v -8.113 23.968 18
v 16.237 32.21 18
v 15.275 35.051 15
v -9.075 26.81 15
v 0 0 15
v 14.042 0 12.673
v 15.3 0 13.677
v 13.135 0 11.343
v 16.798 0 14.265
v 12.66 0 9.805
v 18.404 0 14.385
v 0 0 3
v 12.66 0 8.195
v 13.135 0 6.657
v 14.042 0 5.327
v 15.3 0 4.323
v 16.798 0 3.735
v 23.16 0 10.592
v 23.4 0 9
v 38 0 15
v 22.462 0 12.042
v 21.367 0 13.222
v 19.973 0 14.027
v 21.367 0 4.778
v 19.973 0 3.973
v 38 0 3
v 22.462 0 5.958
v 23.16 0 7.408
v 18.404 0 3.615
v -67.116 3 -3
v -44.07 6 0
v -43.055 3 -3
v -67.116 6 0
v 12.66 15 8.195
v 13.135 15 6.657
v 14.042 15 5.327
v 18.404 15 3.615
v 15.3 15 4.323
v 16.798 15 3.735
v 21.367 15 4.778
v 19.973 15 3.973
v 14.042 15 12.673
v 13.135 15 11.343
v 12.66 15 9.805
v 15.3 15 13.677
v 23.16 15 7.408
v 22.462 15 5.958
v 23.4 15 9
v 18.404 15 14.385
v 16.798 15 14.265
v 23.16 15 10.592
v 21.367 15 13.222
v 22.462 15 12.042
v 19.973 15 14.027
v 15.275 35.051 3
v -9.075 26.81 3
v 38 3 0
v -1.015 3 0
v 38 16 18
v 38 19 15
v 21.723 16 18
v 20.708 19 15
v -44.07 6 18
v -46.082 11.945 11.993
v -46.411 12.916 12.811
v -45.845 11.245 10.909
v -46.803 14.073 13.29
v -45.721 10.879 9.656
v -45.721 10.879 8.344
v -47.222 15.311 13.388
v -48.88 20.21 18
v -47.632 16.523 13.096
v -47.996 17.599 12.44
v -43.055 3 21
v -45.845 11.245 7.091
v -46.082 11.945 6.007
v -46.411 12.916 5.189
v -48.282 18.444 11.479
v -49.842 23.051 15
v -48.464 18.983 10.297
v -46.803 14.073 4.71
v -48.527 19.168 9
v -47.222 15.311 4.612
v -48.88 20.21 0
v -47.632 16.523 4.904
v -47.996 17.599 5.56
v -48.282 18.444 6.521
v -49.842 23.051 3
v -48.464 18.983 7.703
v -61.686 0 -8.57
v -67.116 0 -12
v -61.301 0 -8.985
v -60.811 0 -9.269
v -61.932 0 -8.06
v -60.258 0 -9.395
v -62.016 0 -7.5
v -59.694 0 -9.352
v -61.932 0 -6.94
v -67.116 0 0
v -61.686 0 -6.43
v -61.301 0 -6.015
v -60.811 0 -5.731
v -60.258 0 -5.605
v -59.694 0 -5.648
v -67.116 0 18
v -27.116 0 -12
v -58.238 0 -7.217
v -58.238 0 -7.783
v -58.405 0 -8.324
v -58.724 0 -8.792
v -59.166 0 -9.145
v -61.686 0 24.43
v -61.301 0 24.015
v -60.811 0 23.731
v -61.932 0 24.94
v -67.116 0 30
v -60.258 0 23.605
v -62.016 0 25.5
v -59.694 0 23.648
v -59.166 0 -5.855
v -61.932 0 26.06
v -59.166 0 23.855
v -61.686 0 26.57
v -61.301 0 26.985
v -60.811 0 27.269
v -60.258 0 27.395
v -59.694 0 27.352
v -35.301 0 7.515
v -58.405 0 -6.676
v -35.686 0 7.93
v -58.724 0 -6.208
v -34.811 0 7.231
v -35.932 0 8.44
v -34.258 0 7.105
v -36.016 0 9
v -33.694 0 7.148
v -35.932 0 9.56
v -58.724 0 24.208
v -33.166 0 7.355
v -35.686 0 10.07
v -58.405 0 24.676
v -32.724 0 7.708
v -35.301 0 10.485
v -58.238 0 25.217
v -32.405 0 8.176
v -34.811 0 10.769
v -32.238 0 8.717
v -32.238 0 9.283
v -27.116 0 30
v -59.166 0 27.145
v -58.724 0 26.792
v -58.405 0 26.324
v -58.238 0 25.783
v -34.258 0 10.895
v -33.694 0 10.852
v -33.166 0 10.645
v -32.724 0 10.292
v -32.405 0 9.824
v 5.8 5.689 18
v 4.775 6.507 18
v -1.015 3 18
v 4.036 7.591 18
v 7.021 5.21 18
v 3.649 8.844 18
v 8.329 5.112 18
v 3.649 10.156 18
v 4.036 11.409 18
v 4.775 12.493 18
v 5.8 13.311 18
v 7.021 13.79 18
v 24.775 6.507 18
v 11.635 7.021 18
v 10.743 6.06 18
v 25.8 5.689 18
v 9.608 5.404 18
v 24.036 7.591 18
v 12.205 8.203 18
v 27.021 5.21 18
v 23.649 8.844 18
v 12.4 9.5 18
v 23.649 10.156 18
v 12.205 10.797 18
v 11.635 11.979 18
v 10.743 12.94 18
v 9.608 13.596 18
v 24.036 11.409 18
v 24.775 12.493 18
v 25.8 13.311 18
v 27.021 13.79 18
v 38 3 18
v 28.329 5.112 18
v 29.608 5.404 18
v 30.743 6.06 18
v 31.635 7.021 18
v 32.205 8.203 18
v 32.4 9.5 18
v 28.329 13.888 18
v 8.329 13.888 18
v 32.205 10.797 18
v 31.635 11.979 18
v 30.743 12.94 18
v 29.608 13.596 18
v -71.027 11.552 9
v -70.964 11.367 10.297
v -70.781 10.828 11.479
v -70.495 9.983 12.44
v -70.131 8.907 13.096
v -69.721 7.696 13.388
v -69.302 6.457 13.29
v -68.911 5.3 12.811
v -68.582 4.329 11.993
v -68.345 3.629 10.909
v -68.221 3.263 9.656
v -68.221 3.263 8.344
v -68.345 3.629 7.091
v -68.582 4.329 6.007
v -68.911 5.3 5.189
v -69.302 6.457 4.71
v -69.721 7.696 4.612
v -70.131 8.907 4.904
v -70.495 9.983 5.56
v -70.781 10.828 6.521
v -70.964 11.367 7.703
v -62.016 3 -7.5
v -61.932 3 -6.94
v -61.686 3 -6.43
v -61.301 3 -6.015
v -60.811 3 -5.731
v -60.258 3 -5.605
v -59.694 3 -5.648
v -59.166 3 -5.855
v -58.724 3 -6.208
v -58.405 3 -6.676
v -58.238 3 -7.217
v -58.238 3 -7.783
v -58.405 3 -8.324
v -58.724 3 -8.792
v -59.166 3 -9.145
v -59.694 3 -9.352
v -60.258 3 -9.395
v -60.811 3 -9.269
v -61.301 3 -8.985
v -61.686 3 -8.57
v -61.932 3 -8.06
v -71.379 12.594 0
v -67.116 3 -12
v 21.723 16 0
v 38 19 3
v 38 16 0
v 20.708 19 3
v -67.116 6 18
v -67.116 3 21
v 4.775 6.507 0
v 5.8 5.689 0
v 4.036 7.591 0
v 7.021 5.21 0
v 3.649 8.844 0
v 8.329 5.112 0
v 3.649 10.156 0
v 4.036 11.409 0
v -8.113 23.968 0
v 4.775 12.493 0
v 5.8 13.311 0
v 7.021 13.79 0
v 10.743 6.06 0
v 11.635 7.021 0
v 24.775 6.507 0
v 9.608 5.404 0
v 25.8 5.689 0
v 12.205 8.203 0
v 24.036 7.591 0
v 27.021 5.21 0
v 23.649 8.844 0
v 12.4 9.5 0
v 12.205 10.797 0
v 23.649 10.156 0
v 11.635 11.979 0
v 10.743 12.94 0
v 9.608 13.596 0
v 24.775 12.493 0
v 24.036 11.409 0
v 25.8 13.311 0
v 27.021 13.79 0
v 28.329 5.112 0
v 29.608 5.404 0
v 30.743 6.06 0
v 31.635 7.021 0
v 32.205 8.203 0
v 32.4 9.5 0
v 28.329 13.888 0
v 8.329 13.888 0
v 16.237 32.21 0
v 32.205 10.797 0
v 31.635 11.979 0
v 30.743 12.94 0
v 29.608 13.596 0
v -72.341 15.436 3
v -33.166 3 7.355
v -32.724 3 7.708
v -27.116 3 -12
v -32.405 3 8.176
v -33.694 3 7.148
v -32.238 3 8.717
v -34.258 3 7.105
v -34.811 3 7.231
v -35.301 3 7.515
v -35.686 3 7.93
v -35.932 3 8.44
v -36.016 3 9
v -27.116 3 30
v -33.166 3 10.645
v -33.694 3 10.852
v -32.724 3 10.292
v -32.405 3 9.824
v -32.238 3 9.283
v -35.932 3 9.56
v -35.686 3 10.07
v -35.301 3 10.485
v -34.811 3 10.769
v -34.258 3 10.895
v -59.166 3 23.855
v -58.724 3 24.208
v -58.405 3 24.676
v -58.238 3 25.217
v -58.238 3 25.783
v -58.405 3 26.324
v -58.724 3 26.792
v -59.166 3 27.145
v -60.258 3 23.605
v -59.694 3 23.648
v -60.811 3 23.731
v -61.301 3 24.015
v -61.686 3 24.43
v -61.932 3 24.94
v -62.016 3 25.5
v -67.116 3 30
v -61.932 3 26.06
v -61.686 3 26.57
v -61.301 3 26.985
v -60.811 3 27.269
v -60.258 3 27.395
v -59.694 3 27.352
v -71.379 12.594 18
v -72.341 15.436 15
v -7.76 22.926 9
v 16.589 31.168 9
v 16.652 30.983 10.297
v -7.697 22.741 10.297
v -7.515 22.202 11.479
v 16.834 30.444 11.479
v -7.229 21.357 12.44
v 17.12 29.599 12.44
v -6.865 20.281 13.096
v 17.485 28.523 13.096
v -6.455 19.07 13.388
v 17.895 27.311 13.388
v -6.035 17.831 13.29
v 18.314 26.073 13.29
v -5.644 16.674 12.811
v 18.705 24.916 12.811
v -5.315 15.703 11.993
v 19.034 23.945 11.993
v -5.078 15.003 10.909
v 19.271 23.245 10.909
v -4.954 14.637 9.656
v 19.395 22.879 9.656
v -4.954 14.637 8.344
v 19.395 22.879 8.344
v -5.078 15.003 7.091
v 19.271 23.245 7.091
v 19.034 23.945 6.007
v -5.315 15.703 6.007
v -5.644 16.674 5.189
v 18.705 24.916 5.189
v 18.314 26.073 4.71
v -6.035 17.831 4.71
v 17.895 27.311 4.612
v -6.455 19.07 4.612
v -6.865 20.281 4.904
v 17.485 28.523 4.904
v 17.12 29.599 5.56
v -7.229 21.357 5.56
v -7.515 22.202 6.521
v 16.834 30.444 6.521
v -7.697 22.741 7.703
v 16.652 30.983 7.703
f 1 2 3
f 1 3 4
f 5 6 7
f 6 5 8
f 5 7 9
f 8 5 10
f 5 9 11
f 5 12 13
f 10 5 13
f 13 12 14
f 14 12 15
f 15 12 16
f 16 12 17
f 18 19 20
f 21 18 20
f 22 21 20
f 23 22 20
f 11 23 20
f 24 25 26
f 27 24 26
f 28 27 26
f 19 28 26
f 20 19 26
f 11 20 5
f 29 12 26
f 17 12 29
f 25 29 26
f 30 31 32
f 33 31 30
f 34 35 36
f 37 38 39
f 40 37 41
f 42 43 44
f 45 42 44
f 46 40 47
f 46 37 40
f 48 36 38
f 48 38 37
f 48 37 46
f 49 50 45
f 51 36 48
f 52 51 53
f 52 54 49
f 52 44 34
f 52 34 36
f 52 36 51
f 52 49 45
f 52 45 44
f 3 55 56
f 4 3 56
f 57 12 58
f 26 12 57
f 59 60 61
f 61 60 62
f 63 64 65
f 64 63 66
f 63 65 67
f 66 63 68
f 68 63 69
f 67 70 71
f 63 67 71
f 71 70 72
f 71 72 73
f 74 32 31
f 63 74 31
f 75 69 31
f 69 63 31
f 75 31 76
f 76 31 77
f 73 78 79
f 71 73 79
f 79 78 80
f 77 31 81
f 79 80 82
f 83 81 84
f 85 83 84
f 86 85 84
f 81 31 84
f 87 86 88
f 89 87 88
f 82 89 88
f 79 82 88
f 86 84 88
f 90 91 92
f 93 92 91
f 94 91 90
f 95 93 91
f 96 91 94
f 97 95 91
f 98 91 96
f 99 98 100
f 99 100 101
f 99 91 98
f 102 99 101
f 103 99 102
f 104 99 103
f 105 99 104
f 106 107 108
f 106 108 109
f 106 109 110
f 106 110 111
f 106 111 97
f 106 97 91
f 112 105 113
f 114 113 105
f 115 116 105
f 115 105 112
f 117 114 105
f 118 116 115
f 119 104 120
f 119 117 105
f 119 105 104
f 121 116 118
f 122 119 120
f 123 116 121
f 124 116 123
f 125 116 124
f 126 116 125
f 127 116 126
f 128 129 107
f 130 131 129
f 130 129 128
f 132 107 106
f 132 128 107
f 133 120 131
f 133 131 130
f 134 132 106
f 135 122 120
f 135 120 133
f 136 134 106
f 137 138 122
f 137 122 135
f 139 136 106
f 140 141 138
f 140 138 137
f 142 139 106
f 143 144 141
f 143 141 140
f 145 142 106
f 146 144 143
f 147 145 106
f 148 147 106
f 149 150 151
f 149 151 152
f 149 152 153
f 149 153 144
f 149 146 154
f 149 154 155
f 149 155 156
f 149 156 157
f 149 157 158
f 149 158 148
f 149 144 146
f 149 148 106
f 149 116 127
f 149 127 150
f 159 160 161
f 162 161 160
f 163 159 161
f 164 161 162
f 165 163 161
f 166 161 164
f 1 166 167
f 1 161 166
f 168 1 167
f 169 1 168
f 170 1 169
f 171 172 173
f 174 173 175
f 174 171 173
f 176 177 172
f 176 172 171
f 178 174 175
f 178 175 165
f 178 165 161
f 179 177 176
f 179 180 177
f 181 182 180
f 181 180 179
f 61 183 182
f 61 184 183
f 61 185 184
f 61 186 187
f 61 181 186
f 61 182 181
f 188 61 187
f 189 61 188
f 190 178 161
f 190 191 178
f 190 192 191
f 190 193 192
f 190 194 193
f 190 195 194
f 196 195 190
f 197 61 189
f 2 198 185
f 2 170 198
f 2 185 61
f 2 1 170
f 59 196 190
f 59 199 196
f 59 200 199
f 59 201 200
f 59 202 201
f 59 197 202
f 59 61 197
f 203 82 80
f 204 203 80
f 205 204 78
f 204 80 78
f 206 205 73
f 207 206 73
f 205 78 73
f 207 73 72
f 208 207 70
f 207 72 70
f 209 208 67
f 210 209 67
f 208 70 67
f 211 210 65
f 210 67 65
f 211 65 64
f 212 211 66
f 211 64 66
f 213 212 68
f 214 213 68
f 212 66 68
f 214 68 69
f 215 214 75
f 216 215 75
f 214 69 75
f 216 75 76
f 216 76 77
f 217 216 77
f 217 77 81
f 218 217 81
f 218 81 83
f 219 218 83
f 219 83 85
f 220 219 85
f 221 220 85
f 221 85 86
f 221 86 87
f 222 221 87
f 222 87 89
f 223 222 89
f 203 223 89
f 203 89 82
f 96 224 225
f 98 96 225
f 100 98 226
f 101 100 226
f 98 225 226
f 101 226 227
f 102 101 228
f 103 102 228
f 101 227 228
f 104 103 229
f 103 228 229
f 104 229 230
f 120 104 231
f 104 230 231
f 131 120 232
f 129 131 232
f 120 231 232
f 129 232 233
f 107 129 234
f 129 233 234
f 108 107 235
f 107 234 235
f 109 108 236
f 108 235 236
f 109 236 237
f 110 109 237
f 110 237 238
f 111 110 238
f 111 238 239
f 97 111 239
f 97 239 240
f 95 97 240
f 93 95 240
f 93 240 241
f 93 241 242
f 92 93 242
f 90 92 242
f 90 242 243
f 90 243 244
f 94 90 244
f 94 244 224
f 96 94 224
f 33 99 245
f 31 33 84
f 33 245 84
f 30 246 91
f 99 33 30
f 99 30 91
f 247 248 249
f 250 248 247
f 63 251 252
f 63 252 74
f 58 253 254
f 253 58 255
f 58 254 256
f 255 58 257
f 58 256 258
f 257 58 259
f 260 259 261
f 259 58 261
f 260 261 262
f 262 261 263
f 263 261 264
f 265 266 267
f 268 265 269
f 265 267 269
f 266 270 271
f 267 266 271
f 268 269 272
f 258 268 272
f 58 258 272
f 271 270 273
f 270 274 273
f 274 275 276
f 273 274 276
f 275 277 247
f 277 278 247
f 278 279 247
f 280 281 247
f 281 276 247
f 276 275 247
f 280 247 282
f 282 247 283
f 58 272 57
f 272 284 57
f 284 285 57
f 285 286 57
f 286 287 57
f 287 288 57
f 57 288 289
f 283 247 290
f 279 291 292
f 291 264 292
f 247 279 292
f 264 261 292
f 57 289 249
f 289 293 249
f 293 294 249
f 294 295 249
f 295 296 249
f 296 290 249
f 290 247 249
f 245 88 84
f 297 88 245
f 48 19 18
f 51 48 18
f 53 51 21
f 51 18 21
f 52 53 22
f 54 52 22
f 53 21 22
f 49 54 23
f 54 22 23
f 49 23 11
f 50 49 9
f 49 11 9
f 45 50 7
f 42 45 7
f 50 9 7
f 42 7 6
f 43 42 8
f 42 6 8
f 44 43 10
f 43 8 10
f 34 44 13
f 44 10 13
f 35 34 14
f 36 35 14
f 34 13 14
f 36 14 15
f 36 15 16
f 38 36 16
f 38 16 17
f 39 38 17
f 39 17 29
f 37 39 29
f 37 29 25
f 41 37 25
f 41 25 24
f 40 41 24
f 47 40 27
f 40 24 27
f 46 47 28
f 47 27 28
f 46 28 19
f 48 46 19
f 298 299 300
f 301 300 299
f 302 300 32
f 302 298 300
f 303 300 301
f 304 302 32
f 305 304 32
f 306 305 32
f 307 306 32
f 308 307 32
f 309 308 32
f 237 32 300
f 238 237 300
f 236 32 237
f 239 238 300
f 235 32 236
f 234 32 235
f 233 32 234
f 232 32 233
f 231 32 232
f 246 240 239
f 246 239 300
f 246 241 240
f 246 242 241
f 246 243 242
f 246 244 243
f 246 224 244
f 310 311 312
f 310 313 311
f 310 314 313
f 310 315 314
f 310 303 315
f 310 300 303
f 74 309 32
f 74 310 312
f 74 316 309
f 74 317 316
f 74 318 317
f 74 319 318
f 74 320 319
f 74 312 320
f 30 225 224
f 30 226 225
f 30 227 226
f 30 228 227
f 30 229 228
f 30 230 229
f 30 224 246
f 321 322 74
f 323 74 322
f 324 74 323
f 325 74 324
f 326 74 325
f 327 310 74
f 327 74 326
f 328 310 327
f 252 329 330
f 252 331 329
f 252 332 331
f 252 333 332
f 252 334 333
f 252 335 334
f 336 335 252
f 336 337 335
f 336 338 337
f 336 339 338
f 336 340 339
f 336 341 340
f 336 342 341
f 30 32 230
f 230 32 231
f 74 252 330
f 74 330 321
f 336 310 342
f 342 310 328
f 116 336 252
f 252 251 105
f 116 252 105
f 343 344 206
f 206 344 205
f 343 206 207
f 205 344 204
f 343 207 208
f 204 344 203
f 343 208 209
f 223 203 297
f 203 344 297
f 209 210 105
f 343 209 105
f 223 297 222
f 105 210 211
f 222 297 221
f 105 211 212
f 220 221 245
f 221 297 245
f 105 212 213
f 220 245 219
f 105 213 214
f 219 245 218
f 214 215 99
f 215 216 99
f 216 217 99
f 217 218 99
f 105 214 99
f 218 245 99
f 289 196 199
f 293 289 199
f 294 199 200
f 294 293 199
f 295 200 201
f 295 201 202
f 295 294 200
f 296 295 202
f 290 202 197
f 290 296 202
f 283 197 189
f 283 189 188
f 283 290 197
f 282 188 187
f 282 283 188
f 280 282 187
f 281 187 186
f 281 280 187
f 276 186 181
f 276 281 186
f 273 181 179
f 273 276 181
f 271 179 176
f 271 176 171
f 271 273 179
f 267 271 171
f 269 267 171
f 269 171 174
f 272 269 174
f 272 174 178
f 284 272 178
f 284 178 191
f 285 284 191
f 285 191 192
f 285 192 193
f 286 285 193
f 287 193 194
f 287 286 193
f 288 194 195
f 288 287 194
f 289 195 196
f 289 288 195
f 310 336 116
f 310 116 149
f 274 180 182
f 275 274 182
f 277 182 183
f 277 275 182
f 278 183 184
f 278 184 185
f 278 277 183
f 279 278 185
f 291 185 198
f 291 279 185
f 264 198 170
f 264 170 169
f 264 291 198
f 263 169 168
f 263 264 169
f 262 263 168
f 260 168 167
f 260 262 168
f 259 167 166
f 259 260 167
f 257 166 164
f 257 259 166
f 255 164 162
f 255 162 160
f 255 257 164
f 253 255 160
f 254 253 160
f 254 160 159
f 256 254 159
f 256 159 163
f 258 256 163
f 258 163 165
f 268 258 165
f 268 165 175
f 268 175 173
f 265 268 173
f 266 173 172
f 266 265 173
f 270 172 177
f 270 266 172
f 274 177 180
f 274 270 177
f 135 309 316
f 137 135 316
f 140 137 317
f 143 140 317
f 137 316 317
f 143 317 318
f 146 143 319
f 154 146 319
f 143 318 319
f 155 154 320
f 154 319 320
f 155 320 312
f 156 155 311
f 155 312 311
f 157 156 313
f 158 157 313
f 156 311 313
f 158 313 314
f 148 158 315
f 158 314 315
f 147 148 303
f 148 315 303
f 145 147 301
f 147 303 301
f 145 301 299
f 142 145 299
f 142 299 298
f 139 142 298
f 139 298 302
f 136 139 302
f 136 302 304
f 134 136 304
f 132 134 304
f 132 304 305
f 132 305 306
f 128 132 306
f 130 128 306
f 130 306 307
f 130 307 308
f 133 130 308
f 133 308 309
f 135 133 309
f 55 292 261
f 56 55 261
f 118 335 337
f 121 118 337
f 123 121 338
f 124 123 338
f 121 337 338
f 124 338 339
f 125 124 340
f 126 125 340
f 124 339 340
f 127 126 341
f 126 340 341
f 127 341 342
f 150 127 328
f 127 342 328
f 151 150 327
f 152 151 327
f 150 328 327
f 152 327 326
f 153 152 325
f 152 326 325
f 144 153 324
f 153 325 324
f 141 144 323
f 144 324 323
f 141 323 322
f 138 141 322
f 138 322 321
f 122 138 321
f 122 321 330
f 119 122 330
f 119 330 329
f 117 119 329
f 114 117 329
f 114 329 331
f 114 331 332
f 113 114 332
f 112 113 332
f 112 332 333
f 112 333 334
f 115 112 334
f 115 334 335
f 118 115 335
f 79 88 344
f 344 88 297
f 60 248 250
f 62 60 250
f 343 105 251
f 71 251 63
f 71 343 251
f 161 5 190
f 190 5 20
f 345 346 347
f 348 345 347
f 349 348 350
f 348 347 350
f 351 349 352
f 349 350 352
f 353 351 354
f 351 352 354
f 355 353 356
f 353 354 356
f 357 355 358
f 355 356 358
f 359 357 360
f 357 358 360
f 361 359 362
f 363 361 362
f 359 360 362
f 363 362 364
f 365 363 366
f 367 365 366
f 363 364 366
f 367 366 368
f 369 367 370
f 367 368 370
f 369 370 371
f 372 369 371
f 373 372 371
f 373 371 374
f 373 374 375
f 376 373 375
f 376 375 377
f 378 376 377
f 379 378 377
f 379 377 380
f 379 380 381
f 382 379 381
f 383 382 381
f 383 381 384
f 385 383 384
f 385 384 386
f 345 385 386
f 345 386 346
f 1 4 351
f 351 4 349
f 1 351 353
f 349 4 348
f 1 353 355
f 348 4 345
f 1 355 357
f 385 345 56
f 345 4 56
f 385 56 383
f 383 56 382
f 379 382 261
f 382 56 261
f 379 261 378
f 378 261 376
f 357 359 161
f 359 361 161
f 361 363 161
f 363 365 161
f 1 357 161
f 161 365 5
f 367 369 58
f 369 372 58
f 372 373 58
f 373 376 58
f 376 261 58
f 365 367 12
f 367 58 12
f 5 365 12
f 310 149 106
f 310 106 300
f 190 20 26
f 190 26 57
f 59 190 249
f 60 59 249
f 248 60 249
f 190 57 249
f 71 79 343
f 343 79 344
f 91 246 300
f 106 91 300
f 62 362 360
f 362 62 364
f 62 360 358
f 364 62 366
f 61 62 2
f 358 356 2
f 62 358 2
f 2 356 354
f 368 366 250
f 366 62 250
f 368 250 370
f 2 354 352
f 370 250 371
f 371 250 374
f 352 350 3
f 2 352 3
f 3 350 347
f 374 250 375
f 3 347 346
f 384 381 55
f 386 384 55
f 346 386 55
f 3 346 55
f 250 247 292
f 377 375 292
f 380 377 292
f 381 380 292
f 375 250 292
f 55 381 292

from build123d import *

# Parameters (mm, degrees)
F0_R          = 4.4
F1_DEPTH      = 18
F2_R          = 5.4
F3_DEPTH      = 15
F4_R          = 4.4
F5_DEPTH      = 55
F6_SIZE       = 3
F7_DEPTH      = 18
F8_DEPTH      = 30
F8_DEPTH_BACK = 12
F9_R          = 4.4
F10_DEPTH     = 45
F11_SIZE      = 3
F12_R         = 1.9
F13_DEPTH     = 25


with BuildPart() as f1:
    # F0 (on Top) → F1 (new body)
    with BuildSketch(Plane.XY):
        Polygon((-9.0745158411, 26.8095021806), (0, 0), (38, 0), (38, 19), (20.7078506061, 19), (15.27478958, 35.0512873608), align=None)
        with Locations((8, 9.5)):
            Circle(F0_R, mode=Mode.SUBTRACT)
        with Locations((28, 9.5)):
            Circle(F0_R, mode=Mode.SUBTRACT)
    extrude(amount=F1_DEPTH)

    # F2 (on Front) → F3 (cut)
    with BuildSketch(Plane.XZ):
        with Locations((18, 9)):
            Circle(F2_R)
    extrude(amount=-F3_DEPTH, mode=Mode.SUBTRACT)

    # F4 (on face) → F5 (cut)
    with BuildSketch(Plane(origin=(24.3493054211, 8.2417851803, 0), x_dir=(-0.3206129906, 0.9472102777, 0), z_dir=(0.9472102777, 0.3206129906, 0))):
        with Locations((19.8036436686, 9)):
            Circle(F4_R)
    extrude(amount=-F5_DEPTH, mode=Mode.SUBTRACT)

    # F6
    f6_edges = [f1.edges().sort_by_distance(p)[0] for p in [
        (3.100137, 30.930395, 18),
        (3.100137, 30.930395, 0),
        (29.353925, 19, 18),
        (29.353925, 19, 0),
        (19, 0, 18),
        (19, 0, 0),
    ]]
    chamfer(f6_edges, length=F6_SIZE)


with BuildPart() as f7:
    # F0 (on Top) → F7 (new body)
    with BuildSketch(Plane.XY):
        Polygon((-72.3410998646, 15.4356386176), (-67.1164244413, 0), (-67.1164244413, 3), (-43.0546485322, 3), (-49.8416348613, 23.0512873608), align=None)
    extrude(amount=F7_DEPTH)

    # F0 (on Top) → F8 (join, two sides)
    with BuildSketch(Plane.XY) as f8_sk:
        Polygon((-67.1164244413, 3), (-67.1164244413, 0), (-27.1164244413, 0), (-27.1164244413, 3), (-43.0546485322, 3), align=None)
    extrude(amount=F8_DEPTH)
    extrude(f8_sk.sketch, amount=-F8_DEPTH_BACK)

    # F9 (on face) → F10 (cut)
    with BuildSketch(Plane(origin=(-37.7178816445, -12.7667985839, 0), x_dir=(-0.3206129906, 0.9472102777, 0), z_dir=(0.9472102777, 0.3206129906, 0))):
        with Locations((29.314291912, 9)):
            Circle(F9_R)
    extrude(amount=-F10_DEPTH, mode=Mode.SUBTRACT)

    # F11
    f11_edges = [f7.edges().sort_by_distance(p)[0] for p in [
        (-61.091367, 19.243463, 18),
        (-61.091367, 19.243463, 0),
        (-55.085536, 3, 18),
        (-55.085536, 3, 0),
    ]]
    chamfer(f11_edges, length=F11_SIZE)

    # F12 (on face) → F13 (cut)
    with BuildSketch(Plane(origin=(0, 3, 0), x_dir=(-1, 0, 0), z_dir=(0, 1, 0))):
        with Locations((60.1164244413, -7.5)):
            Circle(F12_R)
        with Locations((60.1164244413, 25.5)):
            Circle(F12_R)
        with Locations((34.1164244413, 9)):
            Circle(F12_R)
    extrude(amount=-F13_DEPTH, mode=Mode.SUBTRACT)


solid = Compound([f1.part, f7.part])
